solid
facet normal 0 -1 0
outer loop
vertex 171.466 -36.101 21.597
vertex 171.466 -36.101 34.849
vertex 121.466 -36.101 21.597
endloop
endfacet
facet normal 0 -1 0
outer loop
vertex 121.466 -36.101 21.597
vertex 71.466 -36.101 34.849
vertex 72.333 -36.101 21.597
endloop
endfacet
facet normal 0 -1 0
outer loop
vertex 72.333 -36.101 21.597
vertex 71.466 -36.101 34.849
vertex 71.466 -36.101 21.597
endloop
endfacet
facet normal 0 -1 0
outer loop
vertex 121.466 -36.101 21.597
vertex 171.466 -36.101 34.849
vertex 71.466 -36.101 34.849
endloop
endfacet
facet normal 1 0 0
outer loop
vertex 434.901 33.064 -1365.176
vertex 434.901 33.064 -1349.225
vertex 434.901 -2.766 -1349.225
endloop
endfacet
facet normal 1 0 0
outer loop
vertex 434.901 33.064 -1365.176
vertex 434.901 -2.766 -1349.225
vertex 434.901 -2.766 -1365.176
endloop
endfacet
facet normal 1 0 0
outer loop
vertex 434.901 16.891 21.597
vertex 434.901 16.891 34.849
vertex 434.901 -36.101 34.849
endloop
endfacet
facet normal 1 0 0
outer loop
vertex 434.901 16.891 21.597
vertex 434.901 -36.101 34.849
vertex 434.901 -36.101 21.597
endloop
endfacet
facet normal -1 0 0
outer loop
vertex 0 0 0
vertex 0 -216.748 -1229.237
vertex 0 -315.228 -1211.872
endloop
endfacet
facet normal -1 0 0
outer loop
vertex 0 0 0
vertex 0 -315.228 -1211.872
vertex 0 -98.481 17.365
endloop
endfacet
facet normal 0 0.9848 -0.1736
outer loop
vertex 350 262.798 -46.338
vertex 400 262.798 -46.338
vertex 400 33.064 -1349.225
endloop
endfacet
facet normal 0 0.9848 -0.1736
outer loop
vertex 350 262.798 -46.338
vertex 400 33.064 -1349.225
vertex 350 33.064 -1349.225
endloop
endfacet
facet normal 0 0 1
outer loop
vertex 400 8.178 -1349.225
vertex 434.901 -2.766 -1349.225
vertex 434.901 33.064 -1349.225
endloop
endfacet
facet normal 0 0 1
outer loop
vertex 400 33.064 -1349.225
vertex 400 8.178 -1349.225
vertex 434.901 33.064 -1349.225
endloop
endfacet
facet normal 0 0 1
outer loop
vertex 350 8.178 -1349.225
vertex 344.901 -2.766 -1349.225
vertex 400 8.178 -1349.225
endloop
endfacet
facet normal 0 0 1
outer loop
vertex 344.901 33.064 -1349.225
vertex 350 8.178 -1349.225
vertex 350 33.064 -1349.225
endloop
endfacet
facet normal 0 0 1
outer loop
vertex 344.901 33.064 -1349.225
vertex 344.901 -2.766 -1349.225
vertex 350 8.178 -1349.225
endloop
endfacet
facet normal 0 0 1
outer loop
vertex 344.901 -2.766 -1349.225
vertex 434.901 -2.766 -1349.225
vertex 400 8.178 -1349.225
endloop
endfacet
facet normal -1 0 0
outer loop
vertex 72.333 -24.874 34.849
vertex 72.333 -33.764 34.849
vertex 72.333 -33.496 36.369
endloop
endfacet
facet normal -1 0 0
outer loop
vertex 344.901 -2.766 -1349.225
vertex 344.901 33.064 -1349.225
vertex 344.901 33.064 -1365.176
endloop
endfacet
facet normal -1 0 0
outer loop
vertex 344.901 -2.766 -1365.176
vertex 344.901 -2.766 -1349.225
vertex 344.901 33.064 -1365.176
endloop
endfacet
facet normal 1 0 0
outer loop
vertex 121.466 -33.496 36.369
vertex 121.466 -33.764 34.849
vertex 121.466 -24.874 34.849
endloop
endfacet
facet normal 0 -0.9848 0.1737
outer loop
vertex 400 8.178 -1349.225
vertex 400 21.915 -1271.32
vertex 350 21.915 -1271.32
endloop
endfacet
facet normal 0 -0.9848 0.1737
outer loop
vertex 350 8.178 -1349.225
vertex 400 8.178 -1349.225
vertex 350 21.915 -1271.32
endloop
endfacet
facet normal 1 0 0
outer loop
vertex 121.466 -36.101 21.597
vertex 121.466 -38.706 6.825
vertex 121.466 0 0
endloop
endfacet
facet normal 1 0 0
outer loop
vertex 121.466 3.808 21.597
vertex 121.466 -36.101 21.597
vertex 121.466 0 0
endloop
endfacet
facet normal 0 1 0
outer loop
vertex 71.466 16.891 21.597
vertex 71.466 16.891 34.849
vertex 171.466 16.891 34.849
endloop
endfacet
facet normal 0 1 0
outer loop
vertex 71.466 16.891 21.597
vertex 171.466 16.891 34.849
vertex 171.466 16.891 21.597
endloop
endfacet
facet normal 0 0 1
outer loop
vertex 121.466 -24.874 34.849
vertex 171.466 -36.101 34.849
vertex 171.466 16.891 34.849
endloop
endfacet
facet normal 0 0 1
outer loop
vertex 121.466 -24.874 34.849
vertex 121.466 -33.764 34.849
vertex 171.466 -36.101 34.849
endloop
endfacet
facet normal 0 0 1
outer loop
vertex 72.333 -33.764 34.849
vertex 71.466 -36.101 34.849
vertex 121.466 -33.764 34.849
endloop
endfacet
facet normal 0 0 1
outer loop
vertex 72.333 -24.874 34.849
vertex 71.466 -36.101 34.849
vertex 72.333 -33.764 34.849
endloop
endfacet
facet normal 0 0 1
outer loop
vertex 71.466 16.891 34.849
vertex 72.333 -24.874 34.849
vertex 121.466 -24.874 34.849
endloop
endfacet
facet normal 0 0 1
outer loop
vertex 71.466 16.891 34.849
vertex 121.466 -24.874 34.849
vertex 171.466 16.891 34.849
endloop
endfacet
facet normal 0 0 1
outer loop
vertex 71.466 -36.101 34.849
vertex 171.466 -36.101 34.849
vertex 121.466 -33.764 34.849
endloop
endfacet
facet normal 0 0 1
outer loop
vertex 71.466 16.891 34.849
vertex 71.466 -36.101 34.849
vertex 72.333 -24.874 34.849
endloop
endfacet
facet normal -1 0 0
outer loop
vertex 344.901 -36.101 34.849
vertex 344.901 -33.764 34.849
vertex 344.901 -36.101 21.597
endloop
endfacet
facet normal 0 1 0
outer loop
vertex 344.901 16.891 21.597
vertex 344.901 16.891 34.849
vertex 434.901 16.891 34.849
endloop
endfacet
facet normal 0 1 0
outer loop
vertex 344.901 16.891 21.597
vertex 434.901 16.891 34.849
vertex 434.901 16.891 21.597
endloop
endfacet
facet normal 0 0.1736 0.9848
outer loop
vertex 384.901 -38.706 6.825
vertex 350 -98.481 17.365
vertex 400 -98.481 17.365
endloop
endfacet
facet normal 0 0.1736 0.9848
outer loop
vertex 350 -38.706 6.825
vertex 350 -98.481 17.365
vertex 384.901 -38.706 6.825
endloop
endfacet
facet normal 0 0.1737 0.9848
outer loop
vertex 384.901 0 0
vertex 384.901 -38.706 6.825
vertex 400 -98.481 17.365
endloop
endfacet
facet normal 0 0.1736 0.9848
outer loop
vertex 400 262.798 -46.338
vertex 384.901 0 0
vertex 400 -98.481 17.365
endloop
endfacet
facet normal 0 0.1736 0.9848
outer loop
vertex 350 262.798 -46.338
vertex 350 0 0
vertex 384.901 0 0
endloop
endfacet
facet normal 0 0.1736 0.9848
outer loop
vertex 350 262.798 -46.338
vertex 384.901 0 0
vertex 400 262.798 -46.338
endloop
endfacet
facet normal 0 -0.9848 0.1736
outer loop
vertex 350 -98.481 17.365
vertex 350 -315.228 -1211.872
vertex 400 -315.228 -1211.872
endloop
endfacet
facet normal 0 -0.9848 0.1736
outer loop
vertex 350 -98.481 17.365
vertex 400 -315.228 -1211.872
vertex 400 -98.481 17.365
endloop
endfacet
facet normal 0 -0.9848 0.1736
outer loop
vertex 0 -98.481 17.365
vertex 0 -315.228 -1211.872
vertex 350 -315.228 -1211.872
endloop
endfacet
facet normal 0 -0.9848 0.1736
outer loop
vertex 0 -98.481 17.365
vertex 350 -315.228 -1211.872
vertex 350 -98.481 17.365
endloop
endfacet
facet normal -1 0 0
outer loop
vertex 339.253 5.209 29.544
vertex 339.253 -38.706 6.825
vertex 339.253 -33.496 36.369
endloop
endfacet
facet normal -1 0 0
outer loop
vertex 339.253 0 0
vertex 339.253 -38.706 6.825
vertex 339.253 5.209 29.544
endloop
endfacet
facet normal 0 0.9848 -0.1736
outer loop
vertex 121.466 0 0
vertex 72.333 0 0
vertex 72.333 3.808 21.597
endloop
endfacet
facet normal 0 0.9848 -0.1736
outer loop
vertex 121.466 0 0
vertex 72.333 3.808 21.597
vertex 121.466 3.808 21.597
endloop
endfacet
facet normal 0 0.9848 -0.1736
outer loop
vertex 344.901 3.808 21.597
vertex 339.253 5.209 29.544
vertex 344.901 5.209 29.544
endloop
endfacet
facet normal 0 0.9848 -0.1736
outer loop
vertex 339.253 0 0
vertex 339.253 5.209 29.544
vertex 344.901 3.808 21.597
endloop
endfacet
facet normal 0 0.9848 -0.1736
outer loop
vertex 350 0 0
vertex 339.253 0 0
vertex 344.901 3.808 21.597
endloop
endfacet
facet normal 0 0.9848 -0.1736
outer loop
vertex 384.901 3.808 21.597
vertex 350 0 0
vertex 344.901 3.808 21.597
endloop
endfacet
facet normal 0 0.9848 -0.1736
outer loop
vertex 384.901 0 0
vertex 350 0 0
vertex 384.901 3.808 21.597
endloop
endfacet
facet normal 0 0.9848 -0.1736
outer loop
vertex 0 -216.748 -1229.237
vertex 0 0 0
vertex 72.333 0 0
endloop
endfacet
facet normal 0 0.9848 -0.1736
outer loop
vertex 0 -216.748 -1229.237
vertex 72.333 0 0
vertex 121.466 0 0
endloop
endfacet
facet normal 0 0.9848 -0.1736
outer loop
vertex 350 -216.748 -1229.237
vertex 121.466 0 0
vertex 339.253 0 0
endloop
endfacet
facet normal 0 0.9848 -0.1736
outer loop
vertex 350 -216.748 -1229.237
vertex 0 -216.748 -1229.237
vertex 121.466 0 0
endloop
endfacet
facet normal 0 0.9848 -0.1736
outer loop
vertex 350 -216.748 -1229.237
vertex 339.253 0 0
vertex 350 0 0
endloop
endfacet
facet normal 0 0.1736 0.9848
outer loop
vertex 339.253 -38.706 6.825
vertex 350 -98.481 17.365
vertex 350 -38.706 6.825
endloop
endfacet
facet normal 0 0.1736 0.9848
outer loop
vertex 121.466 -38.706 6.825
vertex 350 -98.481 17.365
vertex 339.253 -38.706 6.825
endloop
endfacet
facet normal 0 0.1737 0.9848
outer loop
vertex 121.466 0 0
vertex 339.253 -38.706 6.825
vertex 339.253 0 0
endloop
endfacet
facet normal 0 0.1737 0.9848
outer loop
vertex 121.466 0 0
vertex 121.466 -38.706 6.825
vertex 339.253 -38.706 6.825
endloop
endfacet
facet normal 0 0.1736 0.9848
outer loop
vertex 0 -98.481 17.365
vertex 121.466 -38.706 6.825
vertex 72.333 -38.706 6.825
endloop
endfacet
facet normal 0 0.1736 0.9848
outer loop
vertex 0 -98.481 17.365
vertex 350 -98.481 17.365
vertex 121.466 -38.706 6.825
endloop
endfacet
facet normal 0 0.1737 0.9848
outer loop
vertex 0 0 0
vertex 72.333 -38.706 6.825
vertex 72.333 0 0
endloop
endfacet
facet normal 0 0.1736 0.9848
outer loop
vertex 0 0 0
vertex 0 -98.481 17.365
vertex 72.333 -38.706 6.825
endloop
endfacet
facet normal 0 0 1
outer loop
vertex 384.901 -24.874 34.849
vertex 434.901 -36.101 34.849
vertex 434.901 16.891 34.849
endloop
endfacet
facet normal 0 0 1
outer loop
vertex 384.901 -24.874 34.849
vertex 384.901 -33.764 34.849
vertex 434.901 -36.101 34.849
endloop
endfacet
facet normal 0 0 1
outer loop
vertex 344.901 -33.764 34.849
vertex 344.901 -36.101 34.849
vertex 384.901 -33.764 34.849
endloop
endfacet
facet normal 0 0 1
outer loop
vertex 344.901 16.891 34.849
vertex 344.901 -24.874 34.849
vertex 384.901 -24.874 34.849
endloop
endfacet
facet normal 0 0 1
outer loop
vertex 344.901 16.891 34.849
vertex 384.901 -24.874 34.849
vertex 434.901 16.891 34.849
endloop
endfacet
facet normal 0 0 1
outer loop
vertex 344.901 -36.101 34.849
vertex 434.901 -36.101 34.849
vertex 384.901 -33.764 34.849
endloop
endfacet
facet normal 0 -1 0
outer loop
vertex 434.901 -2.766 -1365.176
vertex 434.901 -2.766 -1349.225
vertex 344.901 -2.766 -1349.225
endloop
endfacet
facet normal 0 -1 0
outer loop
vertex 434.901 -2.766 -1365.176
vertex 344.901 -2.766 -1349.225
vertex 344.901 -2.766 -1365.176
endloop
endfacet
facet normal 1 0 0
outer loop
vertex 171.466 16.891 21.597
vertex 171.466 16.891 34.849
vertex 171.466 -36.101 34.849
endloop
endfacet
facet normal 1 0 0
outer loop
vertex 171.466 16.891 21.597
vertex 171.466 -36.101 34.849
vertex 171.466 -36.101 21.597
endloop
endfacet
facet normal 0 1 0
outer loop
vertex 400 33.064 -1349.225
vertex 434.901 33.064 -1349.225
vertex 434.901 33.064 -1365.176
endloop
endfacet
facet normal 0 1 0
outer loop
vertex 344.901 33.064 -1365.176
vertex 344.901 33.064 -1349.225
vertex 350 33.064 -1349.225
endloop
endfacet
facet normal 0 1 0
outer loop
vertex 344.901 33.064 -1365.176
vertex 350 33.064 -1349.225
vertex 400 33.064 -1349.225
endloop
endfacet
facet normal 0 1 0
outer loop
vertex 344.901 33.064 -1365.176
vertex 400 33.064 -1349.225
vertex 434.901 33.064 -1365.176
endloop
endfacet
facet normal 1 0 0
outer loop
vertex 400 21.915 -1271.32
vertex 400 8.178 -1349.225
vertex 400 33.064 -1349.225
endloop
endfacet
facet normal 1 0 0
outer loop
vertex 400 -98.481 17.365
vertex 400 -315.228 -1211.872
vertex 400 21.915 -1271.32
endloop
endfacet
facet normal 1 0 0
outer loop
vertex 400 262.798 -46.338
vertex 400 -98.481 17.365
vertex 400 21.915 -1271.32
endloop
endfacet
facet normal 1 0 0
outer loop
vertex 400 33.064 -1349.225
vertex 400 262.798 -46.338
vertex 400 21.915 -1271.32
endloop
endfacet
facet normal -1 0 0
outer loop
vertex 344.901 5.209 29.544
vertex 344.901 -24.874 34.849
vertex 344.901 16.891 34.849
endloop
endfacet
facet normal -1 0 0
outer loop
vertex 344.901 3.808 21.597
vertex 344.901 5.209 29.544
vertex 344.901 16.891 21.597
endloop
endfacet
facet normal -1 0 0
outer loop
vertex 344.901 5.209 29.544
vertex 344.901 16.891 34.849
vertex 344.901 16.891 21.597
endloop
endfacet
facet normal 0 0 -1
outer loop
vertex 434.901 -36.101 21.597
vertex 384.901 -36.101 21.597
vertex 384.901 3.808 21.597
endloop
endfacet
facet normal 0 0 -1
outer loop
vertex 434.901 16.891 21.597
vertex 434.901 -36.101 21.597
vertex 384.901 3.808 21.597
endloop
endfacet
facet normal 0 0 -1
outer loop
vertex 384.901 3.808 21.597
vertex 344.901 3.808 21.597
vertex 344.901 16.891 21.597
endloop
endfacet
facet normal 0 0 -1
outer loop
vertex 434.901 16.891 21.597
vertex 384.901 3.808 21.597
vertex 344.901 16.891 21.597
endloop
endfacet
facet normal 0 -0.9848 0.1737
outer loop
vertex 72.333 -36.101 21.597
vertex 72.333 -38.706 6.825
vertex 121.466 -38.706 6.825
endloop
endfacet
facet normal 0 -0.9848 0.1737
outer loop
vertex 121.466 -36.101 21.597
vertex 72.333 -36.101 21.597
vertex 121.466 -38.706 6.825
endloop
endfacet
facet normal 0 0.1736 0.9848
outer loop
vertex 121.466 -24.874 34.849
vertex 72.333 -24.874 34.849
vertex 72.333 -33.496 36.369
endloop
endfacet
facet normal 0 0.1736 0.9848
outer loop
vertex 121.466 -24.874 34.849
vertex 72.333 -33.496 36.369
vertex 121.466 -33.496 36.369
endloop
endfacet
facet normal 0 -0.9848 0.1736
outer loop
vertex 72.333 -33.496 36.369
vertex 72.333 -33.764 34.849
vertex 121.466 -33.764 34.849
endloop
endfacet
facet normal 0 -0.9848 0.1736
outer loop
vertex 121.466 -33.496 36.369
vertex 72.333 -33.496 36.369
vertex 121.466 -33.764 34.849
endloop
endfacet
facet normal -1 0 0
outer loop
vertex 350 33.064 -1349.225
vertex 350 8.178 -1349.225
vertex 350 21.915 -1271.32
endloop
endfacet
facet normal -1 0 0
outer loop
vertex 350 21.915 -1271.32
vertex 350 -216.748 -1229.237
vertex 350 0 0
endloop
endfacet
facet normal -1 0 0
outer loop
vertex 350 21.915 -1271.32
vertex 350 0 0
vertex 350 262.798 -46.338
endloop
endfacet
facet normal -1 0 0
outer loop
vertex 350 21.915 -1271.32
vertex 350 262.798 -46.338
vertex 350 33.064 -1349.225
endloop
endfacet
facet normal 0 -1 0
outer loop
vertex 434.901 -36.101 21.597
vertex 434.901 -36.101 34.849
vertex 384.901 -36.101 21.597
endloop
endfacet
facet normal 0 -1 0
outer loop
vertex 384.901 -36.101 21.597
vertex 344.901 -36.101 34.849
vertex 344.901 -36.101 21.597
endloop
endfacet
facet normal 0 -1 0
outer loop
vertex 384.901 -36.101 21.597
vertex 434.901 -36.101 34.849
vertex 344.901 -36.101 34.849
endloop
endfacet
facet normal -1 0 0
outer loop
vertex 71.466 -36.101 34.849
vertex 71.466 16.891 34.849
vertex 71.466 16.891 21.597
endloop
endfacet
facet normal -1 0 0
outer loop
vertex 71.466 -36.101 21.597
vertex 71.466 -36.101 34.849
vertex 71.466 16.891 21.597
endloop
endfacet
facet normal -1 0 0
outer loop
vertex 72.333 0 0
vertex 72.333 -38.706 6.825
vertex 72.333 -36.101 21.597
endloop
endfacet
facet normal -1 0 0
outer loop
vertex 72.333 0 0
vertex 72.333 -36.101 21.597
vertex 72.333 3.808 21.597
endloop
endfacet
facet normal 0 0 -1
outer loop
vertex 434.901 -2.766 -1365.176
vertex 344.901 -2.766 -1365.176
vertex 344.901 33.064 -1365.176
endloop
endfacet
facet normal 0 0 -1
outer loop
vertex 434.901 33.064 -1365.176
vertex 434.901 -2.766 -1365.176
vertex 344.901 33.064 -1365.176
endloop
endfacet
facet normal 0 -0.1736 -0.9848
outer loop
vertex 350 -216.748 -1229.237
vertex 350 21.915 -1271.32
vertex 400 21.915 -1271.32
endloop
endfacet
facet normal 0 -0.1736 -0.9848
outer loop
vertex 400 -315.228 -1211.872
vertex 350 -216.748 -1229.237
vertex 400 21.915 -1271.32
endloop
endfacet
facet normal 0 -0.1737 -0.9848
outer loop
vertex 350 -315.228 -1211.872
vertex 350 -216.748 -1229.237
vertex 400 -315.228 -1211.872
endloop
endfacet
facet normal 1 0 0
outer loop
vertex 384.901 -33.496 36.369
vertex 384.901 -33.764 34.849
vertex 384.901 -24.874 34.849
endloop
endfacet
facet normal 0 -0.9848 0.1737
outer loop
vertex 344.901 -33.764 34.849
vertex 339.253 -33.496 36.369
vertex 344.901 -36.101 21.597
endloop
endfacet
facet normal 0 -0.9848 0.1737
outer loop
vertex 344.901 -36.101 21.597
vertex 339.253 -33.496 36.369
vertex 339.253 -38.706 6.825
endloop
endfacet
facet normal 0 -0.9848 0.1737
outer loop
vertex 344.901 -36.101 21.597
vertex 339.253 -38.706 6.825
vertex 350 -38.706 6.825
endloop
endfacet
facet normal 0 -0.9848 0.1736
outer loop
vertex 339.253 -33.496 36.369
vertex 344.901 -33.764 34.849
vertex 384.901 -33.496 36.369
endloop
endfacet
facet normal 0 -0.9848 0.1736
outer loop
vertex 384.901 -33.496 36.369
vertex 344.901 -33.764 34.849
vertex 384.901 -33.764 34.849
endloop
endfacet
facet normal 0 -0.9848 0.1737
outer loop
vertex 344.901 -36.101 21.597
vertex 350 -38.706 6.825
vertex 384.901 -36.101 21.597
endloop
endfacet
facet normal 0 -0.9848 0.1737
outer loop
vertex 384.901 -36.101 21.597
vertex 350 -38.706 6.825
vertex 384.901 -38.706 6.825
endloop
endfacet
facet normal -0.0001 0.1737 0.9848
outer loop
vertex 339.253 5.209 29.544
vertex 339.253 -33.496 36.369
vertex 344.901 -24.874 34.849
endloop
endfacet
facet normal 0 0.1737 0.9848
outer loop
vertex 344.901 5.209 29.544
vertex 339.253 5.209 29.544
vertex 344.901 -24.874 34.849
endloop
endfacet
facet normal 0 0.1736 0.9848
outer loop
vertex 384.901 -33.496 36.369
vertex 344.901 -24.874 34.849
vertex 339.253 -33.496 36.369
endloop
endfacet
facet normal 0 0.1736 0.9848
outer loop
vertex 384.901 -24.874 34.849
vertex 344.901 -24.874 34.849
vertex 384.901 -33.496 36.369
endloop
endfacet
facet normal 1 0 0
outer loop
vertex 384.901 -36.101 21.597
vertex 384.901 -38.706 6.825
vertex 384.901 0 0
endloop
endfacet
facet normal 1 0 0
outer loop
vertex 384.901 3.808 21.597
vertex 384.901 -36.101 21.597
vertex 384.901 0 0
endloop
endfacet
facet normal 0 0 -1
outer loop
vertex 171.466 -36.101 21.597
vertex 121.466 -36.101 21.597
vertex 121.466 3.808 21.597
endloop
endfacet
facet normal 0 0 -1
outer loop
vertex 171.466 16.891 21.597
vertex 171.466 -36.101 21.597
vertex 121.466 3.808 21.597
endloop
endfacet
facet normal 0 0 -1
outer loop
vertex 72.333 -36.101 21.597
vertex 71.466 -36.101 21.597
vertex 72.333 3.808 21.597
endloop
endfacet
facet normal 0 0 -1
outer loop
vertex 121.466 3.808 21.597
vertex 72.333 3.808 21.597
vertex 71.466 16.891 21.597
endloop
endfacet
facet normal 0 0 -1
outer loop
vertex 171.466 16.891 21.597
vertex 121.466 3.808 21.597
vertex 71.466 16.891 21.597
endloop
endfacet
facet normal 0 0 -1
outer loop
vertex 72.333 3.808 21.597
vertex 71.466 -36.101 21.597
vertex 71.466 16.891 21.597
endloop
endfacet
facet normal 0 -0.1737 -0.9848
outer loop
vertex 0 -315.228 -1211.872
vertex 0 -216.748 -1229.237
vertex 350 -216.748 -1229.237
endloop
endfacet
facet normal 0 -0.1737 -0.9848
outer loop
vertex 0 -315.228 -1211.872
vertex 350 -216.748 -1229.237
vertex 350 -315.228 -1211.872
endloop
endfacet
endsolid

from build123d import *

# Parameters (mm, degrees)
BOSS_EXTRUDE1_DEPTH      = 350
BOSS_EXTRUDE2_DEPTH      = 50
SKETCH3_W                = 50
SKETCH3_H                = 24.508106186
BOSS_EXTRUDE3_DEPTH      = 90
SKETCH4_W                = 49.133865319
SKETCH4_H                = 39.302733228
SKETCH4_W_2              = 45.648473343
BOSS_EXTRUDE4_DEPTH      = 30
BOSS_EXTRUDE5_DEPTH      = 50
BOSS_EXTRUDE5_DEPTH_BACK = 40
SKETCH5_W                = 13.251857059
SKETCH5_H                = 52.991624954
SKETCH5_W_2              = 15.951284084
SKETCH5_H_2              = 35.82978704
BOSS_EXTRUDE6_DEPTH      = 50
BOSS_EXTRUDE6_DEPTH_BACK = 50
SKETCH6_W                = 13.251857059
SKETCH6_H                = 52.991624954


with BuildPart() as part:
    # Sketch1 → Boss-Extrude1 (new body)
    with BuildSketch(Plane(origin=(0, 0, 0), x_dir=(0, 0, -1), z_dir=(1, 0, 0))):
        Polygon((0, 0), (1229.23703731, -216.747655364), (1211.872219543, -315.228430665), (-17.364817767, -98.480775301), align=None)
    extrude(amount=BOSS_EXTRUDE1_DEPTH)

    # Sketch2 → Boss-Extrude2 (add)
    with BuildSketch(Plane(origin=(350, 0, 0), x_dir=(0, 0, -1), z_dir=(1, 0, 0))):
        Polygon((-17.364817767, -98.480775301), (46.338371166, 262.797961946), (1275.575408476, 46.050306583), (1211.872219543, -315.228430665), align=None)
    extrude(amount=BOSS_EXTRUDE2_DEPTH)

    # Sketch3 → Boss-Extrude3 (add)
    with BuildSketch(Plane(origin=(0, -216.747655364, -1229.23703731), x_dir=(-1, 0, 0), z_dir=(0, -0.17364817766693216, -0.9848077530122078))):
        with Locations((-375, 254.597991017)):
            Rectangle(SKETCH3_W, SKETCH3_H)
    extrude(amount=BOSS_EXTRUDE3_DEPTH)

    # Sketch4 → Boss-Extrude4 (add)
    with BuildSketch(Plane(origin=(0, 0, 0), x_dir=(1, 0, 0), z_dir=(0, 0.17364817766693608, 0.9848077530122071))):
        with Locations((96.899550705, -19.651366614)):
            Rectangle(SKETCH4_W, SKETCH4_H)
        with Locations((362.077115008, -19.651366614)):
            Rectangle(SKETCH4_W_2, SKETCH4_H)
    extrude(amount=BOSS_EXTRUDE4_DEPTH)

    # Sketch5 → Boss-Extrude5 (add, two sides: drawn at the far end of the back side and taken through both)
    with BuildSketch(Plane(origin=(384.901351679, 0, 0), x_dir=(0, 0, -1), z_dir=(1, 0, 0)).offset(-BOSS_EXTRUDE5_DEPTH_BACK)):
        with Locations((-28.222892828, -9.605101255)):
            Rectangle(SKETCH5_W, SKETCH5_H)
        with Locations((1357.200809648, 15.148973405)):
            Rectangle(SKETCH5_W_2, SKETCH5_H_2)
    extrude(amount=BOSS_EXTRUDE5_DEPTH + BOSS_EXTRUDE5_DEPTH_BACK)

    # Sketch6 → Boss-Extrude6 (add, two sides: drawn at the far end of the back side and taken through both)
    with BuildSketch(Plane(origin=(121.466483364, 0, 0), x_dir=(0, 0, -1), z_dir=(1, 0, 0)).offset(-BOSS_EXTRUDE6_DEPTH_BACK)):
        with Locations((-28.222892828, -9.605101255)):
            Rectangle(SKETCH6_W, SKETCH6_H)
    extrude(amount=BOSS_EXTRUDE6_DEPTH + BOSS_EXTRUDE6_DEPTH_BACK)


solid = part.part
